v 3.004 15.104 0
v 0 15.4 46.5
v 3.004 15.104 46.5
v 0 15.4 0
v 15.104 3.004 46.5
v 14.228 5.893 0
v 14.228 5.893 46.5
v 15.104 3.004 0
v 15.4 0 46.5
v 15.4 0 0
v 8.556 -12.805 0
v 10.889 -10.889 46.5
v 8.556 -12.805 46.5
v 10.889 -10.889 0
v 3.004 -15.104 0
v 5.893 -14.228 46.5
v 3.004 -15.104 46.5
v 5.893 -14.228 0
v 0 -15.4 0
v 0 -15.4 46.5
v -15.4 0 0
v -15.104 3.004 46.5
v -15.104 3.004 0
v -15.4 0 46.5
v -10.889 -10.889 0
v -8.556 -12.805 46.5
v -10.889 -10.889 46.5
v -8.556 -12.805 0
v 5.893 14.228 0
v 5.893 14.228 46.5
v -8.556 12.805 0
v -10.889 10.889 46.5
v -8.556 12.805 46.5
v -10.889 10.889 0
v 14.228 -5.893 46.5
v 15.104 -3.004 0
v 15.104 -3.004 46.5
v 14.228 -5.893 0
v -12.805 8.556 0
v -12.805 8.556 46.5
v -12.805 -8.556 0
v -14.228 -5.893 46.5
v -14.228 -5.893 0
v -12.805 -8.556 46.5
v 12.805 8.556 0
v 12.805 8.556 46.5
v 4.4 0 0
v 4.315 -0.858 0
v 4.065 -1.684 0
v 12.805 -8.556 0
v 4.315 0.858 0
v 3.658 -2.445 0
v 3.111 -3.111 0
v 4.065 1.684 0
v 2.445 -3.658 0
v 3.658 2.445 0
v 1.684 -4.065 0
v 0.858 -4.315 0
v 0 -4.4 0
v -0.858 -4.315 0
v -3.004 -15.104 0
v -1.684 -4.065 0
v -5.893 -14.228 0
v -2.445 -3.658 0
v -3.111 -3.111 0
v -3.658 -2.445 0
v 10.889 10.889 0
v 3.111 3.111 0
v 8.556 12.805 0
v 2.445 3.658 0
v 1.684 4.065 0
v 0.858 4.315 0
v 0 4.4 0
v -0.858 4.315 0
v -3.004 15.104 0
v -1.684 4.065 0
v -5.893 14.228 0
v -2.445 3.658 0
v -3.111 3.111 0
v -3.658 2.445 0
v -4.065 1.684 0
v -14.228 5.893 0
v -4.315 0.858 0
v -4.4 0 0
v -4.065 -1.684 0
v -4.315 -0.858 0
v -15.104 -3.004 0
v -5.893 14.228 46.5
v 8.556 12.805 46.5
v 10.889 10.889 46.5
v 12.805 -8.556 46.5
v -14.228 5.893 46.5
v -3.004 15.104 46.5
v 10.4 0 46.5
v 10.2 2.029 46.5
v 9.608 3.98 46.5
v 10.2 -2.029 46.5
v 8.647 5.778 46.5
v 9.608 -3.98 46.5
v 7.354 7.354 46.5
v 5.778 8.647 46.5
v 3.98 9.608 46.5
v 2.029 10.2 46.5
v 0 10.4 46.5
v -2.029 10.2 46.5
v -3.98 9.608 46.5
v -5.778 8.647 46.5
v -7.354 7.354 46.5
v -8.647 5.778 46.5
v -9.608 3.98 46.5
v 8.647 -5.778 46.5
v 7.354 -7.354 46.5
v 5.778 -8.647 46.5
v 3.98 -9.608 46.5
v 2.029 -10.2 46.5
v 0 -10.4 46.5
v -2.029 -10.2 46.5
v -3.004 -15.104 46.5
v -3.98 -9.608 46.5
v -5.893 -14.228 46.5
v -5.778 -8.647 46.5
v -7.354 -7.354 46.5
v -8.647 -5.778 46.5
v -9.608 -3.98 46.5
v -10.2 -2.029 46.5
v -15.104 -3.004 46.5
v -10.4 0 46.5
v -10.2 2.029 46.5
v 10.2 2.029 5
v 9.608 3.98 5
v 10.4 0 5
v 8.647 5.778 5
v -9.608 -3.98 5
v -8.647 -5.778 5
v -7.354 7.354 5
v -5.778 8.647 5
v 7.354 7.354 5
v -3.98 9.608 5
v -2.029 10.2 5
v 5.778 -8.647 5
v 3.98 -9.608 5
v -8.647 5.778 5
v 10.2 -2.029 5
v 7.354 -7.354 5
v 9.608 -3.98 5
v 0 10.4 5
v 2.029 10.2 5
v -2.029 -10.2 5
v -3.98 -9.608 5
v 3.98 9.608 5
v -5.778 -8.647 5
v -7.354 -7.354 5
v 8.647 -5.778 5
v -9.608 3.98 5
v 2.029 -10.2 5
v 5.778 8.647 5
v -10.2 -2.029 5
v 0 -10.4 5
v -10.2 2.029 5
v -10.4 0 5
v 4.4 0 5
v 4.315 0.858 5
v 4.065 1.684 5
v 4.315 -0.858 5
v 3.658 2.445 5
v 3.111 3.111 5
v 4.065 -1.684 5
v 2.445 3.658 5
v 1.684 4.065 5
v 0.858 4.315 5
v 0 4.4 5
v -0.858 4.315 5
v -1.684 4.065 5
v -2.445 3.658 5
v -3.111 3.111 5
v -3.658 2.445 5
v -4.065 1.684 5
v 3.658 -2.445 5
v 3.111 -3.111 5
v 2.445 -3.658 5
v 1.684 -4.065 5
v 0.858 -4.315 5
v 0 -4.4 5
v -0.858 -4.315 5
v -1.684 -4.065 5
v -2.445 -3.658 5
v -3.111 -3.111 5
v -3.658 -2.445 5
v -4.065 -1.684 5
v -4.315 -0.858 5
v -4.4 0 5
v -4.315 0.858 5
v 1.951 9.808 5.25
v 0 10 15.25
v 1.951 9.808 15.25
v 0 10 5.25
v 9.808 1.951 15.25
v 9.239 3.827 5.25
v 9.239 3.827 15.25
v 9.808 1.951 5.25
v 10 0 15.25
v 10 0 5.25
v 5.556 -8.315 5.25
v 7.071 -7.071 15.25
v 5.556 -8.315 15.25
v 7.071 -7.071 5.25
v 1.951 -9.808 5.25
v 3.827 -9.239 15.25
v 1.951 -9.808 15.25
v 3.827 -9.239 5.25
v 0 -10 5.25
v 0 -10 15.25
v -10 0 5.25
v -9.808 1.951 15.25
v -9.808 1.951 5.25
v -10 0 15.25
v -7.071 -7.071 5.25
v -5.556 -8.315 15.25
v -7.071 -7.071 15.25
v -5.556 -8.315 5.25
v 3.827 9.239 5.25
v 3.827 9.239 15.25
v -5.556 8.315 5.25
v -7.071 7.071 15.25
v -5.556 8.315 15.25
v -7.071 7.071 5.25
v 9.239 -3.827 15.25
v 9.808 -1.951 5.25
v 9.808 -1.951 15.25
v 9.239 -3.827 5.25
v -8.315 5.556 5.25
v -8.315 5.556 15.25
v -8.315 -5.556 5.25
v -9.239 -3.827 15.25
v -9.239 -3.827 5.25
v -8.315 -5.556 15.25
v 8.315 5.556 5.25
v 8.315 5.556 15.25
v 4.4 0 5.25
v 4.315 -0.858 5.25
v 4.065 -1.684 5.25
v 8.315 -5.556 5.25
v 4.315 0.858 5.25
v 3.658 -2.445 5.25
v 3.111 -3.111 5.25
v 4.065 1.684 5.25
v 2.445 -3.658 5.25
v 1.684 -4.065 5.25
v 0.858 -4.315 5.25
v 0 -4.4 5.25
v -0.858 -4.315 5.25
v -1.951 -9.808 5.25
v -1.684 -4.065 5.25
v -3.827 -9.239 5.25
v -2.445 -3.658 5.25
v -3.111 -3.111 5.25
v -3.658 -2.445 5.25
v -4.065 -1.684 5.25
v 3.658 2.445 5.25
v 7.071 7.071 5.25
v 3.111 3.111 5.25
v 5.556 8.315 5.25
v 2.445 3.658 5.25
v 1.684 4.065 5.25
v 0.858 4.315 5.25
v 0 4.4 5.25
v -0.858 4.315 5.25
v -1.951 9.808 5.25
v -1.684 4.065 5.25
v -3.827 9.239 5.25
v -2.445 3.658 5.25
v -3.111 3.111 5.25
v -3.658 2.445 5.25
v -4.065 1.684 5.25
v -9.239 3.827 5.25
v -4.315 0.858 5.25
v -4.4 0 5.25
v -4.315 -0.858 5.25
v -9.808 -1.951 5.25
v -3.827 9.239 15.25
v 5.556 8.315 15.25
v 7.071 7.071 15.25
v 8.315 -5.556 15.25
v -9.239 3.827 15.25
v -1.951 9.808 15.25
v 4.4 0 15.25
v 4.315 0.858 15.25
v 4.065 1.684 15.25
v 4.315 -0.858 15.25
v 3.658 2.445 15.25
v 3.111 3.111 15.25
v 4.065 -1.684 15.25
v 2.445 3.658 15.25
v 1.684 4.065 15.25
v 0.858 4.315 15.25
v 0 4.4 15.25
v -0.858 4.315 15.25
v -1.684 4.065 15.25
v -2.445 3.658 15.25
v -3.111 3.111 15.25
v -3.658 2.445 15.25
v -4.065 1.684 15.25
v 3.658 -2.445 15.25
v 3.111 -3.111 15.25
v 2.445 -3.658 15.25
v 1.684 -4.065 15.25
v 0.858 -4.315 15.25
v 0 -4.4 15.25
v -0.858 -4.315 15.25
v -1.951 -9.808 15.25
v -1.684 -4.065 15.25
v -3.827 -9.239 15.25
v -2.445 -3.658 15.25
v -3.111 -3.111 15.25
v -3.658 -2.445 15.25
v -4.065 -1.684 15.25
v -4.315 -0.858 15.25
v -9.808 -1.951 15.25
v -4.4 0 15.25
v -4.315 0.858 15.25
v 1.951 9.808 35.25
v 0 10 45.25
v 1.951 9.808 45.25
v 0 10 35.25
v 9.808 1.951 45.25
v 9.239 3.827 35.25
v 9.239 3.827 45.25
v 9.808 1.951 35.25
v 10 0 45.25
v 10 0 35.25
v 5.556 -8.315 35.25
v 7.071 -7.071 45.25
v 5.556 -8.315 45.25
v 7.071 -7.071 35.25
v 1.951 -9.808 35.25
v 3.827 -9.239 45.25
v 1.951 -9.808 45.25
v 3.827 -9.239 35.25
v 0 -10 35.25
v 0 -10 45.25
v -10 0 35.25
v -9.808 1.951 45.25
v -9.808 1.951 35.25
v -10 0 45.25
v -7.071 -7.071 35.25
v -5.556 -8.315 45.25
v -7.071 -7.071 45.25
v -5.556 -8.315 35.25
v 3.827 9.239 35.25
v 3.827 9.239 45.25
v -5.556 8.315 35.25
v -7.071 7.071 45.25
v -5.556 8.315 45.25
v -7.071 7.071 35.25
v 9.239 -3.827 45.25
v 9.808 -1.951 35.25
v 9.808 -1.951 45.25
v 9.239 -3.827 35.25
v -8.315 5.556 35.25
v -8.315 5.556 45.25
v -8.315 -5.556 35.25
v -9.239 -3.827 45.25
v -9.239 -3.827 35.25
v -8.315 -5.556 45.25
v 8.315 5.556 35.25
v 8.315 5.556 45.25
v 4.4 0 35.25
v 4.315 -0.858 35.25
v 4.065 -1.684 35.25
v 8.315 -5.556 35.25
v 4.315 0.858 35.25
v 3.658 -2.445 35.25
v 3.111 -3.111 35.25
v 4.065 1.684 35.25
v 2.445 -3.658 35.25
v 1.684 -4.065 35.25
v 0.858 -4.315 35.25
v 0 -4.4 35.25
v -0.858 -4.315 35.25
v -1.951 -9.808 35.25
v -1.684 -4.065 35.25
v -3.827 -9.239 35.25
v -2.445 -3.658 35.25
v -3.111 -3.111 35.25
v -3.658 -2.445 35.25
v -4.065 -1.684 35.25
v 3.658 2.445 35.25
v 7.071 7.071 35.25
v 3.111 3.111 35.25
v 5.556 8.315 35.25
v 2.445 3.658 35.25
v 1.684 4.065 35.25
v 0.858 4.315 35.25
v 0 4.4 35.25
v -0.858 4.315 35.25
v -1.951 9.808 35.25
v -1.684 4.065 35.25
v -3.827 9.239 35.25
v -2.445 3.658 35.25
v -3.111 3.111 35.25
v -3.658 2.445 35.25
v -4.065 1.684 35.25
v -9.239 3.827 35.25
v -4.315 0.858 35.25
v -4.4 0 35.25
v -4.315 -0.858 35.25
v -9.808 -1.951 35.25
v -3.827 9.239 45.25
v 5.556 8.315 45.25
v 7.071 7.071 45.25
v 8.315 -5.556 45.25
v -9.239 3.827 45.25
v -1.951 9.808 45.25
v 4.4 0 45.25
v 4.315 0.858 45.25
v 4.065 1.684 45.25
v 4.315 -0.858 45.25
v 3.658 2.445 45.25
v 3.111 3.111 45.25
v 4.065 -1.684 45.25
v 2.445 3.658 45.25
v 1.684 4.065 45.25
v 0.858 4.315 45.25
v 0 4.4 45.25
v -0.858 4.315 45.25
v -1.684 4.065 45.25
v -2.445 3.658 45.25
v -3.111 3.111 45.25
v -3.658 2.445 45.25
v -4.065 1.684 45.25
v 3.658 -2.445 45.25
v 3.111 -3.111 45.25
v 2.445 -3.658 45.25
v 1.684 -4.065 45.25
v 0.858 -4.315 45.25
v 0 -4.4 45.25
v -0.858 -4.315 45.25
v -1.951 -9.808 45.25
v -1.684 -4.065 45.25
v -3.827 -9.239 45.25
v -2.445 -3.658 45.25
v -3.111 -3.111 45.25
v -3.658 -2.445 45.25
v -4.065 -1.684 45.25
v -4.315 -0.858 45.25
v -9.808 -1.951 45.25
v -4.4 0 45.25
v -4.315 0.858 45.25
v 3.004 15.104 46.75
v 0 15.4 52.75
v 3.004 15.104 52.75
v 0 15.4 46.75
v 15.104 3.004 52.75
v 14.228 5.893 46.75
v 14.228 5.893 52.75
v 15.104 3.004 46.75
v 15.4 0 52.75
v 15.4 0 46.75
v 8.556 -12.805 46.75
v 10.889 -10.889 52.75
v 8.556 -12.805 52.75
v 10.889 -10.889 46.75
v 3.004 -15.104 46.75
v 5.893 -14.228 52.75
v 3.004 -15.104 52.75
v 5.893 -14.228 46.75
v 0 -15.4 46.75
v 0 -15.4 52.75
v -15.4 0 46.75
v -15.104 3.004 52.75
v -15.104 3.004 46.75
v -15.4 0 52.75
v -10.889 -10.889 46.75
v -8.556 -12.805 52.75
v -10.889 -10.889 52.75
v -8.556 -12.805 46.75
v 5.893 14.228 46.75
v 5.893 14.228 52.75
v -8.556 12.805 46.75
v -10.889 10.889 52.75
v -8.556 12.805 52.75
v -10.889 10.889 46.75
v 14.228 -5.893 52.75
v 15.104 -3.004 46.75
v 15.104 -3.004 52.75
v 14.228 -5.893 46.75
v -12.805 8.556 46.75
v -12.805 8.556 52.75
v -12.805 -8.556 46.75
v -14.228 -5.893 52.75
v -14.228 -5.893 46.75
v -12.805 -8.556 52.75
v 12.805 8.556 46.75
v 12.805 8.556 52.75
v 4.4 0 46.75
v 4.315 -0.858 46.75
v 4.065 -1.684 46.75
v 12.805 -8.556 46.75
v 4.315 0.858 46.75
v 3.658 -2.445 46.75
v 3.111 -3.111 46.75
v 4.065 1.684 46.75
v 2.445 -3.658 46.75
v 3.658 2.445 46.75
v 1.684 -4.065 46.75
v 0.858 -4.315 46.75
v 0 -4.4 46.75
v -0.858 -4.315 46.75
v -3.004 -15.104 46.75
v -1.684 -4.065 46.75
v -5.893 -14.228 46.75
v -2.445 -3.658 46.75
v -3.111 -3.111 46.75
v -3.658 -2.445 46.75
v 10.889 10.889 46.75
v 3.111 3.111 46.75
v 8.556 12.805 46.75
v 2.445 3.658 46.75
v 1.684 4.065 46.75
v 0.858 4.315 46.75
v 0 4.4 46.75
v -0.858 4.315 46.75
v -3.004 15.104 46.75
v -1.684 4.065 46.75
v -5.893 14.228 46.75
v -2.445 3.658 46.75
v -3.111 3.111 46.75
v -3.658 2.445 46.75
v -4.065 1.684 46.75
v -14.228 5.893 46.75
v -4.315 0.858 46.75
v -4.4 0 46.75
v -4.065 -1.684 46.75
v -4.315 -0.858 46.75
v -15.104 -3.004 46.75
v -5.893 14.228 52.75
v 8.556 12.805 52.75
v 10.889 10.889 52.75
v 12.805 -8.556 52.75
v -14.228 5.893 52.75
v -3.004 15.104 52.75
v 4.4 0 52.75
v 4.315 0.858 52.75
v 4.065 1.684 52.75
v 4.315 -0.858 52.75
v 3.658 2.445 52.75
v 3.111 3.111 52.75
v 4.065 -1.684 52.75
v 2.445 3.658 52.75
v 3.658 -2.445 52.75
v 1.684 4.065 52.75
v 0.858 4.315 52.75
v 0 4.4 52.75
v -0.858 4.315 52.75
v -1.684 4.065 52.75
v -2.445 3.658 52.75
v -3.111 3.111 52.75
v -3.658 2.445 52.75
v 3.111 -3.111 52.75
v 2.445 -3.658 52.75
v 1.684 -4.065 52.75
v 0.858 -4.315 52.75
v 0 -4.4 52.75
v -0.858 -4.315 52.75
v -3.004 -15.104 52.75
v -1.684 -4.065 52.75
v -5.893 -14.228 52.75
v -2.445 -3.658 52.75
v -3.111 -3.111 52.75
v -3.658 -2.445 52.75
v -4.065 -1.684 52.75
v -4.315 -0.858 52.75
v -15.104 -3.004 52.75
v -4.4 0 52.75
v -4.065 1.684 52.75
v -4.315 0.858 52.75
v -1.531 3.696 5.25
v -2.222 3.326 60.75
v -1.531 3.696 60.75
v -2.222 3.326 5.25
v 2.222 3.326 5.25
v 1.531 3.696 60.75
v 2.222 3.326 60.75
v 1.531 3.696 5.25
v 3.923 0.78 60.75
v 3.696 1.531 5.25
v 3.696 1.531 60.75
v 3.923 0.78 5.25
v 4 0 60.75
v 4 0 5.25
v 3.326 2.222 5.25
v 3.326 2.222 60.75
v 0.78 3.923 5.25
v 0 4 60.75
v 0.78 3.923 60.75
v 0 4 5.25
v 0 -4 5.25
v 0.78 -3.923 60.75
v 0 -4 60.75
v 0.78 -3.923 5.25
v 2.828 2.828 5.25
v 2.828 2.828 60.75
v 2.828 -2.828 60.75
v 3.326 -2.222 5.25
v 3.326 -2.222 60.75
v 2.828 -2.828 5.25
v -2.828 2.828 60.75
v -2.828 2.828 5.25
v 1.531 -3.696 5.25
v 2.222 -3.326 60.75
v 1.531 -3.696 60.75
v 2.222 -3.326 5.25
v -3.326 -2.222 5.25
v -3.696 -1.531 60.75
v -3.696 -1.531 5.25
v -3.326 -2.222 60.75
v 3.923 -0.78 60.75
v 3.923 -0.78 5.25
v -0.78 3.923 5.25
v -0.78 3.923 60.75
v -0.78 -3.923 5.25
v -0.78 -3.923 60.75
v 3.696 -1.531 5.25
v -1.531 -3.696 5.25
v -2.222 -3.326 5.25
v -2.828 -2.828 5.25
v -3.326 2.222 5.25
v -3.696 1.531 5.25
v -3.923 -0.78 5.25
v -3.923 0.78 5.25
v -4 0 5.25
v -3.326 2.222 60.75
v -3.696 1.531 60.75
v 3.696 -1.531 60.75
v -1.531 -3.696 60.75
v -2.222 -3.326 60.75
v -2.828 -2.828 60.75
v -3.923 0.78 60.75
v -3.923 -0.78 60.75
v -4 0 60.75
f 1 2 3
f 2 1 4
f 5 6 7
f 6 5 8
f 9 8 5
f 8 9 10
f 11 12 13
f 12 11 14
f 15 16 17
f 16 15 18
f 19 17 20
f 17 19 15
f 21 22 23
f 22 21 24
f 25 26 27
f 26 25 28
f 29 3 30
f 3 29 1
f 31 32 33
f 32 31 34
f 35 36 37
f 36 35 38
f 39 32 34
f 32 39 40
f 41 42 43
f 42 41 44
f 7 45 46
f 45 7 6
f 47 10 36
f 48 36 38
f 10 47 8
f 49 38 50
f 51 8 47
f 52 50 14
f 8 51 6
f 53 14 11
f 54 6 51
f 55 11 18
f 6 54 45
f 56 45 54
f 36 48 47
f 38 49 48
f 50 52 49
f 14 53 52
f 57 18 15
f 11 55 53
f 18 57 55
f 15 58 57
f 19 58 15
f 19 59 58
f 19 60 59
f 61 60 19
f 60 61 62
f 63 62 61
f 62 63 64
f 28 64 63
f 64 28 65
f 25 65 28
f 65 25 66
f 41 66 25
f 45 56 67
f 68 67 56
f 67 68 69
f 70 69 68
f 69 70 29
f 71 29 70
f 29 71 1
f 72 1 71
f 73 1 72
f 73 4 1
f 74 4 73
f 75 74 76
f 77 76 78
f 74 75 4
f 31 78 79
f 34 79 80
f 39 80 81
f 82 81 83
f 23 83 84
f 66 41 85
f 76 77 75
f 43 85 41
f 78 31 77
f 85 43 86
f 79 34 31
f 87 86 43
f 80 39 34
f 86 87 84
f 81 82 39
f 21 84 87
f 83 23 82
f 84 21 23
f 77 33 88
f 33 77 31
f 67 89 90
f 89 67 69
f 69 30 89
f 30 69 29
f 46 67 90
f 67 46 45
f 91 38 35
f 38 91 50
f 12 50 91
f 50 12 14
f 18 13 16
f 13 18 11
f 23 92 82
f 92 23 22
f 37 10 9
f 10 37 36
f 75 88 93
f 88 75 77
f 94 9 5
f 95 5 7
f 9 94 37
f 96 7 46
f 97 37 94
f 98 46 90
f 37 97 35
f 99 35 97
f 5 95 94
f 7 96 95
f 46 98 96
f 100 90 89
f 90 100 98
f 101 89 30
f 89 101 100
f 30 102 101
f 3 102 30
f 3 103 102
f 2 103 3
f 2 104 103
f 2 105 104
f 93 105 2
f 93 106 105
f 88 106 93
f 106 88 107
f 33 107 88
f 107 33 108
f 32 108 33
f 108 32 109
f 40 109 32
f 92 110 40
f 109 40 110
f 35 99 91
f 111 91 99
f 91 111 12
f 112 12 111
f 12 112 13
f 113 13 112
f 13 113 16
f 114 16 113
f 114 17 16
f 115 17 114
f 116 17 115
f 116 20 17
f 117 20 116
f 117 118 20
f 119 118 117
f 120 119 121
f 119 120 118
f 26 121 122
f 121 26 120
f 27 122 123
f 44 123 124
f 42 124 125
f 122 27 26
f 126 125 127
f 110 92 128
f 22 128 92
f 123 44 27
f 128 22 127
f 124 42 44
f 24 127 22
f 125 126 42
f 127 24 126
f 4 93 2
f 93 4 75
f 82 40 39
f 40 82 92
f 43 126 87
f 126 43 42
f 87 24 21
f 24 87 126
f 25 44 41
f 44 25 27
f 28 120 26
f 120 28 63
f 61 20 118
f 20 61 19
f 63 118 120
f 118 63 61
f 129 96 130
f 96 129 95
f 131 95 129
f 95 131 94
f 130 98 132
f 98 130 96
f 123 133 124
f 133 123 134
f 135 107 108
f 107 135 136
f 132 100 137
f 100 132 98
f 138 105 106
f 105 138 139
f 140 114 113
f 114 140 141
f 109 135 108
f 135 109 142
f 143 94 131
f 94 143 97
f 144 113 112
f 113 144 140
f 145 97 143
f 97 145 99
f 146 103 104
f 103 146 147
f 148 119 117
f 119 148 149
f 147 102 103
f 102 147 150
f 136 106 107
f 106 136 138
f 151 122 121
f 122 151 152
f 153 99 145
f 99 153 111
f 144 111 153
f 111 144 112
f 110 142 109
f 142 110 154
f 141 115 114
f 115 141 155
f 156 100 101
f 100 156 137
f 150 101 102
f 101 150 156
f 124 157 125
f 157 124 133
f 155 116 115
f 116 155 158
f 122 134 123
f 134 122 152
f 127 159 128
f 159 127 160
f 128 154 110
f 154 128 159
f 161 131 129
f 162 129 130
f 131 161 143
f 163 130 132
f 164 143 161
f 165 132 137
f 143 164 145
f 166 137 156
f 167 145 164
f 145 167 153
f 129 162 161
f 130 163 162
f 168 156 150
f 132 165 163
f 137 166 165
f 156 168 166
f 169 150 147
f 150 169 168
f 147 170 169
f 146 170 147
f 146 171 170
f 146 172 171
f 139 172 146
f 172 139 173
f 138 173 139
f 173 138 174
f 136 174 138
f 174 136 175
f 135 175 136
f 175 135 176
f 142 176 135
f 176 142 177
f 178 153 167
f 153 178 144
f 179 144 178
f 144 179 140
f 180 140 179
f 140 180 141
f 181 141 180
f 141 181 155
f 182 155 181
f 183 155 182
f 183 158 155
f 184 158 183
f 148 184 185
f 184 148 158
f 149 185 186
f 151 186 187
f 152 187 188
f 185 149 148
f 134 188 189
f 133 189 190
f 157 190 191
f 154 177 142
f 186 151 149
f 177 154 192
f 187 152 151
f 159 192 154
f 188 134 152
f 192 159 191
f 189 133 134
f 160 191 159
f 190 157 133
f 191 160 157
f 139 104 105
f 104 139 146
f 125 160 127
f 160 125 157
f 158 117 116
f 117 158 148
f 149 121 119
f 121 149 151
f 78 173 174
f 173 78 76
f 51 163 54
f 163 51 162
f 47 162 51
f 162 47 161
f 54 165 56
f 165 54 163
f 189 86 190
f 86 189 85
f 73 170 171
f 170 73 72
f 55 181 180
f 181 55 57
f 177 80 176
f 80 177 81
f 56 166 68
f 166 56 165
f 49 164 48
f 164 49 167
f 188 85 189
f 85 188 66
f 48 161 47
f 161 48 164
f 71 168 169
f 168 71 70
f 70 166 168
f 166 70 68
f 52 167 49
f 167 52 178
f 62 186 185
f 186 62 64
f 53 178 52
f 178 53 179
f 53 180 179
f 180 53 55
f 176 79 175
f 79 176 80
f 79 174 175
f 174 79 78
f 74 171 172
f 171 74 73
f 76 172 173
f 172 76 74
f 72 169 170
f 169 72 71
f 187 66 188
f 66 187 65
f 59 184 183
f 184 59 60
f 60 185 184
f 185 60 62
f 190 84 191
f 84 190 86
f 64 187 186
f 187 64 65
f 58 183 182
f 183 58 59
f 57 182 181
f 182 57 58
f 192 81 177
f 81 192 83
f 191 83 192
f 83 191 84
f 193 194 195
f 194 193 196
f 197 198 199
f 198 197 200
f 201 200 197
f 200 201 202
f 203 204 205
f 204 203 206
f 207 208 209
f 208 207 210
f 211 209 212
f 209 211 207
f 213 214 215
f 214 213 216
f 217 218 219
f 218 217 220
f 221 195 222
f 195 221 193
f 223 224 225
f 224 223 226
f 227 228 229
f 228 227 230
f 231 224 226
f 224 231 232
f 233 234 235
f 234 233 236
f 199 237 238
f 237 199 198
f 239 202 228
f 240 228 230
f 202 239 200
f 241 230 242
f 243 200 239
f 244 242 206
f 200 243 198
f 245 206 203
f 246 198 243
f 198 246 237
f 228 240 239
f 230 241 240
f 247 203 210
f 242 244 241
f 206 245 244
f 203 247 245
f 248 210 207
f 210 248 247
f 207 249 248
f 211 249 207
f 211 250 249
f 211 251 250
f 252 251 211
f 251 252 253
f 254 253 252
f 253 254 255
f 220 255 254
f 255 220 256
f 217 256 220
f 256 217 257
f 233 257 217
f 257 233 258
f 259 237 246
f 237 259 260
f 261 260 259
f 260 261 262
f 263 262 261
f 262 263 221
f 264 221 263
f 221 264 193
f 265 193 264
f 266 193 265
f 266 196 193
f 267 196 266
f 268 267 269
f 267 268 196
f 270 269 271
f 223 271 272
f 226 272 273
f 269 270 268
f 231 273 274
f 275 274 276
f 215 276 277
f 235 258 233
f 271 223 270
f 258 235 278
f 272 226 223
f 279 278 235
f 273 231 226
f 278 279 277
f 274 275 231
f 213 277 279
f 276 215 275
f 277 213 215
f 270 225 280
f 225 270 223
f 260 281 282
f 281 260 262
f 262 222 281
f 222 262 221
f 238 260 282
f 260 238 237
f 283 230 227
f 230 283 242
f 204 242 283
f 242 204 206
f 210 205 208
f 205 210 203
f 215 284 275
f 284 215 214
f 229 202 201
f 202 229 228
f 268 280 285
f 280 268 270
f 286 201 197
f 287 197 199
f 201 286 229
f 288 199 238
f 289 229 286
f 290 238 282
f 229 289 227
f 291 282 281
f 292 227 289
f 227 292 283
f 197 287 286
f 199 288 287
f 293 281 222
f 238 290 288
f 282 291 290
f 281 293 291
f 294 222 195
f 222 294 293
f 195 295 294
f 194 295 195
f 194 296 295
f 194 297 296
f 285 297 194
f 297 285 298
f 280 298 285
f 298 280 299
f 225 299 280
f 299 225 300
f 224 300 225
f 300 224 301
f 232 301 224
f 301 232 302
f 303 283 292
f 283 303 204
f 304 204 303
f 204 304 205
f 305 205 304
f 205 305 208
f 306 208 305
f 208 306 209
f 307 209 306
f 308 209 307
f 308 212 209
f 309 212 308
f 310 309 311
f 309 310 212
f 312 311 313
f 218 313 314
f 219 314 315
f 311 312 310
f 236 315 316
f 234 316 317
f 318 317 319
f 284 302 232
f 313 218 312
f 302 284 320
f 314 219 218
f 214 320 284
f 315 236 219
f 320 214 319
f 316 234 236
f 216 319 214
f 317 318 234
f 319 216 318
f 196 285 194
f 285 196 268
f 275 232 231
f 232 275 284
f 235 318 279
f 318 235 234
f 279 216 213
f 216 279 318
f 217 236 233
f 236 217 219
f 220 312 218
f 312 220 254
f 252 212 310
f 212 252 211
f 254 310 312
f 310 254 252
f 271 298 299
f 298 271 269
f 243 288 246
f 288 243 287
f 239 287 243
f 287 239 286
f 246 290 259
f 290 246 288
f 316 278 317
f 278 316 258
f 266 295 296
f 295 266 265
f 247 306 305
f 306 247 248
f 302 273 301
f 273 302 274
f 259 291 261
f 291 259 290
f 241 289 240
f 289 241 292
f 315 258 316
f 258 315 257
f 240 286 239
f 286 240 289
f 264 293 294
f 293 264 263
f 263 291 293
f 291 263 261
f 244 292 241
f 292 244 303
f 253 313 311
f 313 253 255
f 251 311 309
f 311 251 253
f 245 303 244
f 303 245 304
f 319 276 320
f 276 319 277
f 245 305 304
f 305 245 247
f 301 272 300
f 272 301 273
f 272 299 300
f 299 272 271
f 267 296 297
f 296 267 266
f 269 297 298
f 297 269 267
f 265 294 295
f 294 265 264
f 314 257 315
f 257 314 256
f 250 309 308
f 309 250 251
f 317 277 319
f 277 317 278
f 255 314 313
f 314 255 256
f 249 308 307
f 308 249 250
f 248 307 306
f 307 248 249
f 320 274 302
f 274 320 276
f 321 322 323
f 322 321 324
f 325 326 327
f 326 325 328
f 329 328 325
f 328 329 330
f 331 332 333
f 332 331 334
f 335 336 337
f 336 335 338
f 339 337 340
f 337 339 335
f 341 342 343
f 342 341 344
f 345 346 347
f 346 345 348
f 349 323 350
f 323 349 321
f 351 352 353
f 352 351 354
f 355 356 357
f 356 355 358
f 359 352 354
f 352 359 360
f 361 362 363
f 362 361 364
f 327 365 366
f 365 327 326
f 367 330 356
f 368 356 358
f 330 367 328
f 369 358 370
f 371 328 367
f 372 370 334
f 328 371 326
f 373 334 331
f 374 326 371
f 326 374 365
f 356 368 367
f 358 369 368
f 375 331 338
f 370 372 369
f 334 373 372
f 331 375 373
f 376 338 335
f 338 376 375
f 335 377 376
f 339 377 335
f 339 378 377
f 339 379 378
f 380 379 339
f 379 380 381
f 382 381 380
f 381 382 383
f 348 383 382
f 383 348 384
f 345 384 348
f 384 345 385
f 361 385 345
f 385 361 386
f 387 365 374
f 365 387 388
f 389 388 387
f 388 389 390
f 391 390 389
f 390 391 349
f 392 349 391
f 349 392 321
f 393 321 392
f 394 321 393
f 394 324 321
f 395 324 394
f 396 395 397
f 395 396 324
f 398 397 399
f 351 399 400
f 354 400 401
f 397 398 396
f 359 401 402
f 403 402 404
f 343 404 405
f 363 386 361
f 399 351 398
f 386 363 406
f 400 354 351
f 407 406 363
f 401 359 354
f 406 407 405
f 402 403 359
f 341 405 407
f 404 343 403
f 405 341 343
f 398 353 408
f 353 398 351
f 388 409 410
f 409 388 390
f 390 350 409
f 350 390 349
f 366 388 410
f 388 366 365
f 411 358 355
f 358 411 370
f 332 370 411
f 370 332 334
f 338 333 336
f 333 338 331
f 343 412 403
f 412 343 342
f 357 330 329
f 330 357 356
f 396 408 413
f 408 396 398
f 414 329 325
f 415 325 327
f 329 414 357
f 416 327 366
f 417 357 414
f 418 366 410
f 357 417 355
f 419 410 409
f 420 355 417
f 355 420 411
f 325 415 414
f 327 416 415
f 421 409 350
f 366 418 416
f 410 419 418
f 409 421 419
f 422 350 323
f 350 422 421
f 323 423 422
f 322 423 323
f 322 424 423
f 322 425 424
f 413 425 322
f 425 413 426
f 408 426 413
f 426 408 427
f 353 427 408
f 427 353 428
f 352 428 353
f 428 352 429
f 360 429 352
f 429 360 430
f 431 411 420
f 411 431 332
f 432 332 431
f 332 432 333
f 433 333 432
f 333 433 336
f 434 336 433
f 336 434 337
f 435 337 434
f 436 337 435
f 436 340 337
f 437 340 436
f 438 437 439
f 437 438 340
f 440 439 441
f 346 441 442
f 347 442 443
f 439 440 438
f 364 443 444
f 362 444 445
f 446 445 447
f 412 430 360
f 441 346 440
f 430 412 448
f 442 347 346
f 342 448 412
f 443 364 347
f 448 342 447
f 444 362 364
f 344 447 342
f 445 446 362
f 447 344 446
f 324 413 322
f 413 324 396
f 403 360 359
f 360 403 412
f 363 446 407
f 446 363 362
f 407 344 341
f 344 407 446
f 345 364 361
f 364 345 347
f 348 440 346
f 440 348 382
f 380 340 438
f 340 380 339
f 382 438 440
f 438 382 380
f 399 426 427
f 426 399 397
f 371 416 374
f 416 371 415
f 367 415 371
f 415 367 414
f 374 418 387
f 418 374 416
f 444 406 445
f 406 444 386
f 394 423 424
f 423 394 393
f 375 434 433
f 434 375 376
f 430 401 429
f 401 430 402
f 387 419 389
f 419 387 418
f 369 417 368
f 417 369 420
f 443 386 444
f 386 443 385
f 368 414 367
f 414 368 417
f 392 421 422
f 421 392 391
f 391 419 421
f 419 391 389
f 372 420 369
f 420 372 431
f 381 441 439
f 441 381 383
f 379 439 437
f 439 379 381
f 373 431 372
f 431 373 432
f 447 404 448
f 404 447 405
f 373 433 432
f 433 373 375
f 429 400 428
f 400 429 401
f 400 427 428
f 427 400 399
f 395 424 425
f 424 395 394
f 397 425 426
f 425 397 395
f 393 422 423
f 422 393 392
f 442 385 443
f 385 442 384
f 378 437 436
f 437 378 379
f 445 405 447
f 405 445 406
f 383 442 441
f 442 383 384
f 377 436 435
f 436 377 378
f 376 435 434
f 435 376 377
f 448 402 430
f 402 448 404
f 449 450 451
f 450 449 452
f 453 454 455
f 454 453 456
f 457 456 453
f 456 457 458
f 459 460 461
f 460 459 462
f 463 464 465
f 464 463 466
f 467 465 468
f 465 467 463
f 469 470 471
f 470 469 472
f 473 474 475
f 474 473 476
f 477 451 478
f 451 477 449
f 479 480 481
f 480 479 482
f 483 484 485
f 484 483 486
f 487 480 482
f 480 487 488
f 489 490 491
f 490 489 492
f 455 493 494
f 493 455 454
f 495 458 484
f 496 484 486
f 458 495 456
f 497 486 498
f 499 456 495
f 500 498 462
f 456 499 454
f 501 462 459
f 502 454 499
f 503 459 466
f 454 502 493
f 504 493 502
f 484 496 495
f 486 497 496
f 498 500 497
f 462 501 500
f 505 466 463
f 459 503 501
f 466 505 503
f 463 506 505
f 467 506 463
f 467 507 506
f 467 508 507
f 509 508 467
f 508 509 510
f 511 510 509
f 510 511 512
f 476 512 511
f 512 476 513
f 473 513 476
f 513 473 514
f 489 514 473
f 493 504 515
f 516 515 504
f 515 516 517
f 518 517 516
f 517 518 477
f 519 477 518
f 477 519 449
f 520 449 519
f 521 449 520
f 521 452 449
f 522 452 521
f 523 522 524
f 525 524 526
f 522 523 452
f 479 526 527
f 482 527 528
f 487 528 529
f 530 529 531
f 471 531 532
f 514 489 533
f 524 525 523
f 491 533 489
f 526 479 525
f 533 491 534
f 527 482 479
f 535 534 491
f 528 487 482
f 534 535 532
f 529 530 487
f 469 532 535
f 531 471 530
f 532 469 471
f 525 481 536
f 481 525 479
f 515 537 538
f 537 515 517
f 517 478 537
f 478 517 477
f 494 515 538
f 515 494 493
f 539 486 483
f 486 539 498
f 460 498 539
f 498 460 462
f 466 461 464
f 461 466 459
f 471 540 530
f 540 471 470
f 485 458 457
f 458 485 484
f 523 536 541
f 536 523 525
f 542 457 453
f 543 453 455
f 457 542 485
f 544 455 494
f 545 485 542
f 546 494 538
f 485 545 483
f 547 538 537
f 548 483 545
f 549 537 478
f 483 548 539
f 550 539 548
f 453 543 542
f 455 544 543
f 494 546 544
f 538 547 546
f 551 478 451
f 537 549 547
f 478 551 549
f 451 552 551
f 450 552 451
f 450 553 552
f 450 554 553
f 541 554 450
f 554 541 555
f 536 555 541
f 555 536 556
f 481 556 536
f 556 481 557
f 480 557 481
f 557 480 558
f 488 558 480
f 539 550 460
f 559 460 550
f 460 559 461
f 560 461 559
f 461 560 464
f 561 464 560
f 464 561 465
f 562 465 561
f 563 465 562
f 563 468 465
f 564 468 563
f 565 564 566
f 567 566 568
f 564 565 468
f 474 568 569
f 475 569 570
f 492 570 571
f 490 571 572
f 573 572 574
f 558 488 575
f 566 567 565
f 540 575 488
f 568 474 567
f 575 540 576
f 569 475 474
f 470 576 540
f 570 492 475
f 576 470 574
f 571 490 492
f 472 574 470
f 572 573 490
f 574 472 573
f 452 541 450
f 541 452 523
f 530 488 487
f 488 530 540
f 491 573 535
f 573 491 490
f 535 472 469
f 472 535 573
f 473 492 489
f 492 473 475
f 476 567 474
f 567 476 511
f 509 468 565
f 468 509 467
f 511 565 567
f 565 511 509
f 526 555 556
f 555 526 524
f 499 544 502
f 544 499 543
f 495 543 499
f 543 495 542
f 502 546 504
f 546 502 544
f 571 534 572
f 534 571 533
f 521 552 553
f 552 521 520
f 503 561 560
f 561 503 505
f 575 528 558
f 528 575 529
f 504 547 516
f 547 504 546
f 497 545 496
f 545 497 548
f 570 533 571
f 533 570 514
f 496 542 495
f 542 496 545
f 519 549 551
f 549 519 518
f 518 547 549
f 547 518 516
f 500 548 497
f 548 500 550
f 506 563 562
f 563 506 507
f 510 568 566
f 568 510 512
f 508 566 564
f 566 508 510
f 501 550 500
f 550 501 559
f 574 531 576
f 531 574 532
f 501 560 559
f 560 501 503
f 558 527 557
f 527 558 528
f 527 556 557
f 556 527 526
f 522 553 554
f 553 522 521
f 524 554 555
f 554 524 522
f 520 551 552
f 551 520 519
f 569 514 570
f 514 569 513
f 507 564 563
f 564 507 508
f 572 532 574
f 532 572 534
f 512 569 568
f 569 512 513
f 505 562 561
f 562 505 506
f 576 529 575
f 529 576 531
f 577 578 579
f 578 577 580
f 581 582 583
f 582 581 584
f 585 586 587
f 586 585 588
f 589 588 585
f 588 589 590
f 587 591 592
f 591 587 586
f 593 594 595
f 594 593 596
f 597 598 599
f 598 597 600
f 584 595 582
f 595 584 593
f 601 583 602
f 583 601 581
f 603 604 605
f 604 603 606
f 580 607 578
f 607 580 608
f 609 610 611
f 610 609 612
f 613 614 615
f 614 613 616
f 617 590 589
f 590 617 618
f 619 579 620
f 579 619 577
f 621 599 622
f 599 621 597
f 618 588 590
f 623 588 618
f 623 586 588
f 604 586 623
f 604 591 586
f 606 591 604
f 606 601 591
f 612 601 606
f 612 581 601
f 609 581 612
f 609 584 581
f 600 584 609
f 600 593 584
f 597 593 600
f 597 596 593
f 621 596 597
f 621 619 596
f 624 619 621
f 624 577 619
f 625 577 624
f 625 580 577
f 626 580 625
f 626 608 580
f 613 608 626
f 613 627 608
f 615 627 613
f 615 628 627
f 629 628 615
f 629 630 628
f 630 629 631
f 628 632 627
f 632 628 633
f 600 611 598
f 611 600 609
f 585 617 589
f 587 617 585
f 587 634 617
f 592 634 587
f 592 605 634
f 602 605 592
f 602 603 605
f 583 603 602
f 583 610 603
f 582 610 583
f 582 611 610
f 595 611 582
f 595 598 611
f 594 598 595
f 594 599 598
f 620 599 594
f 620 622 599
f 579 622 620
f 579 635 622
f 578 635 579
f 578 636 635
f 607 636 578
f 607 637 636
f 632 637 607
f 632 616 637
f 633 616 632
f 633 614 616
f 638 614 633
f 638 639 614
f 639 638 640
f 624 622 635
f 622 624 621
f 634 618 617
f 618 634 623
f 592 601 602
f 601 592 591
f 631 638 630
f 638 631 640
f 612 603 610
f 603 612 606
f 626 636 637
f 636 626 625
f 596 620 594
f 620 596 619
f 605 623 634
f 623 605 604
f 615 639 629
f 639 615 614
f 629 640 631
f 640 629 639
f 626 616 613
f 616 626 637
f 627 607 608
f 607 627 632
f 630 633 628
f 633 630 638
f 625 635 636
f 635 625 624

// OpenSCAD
$fn = 32;

// ------------------------------------------------------------------------
// Shaft station: cup d30.8 x 46.5 mm, shaft d8
// Every part is its own module, assembly() places every instance.
// ------------------------------------------------------------------------

// --- part 1 ---
module housing_cup() {
  difference() {
    cylinder(h = 46.5, d = 30.8);
    translate([0, 0, 5]) cylinder(h = 42.5, d = 20.8);
    translate([0, 0, -1]) cylinder(h = 7, d = 8.8);
  }
}

// --- part 2 ---
module bearing_lower() {
  difference() {
      translate([0, 0, 0]) cylinder(h = 10, d = 20);
      translate([0, 0, -1]) cylinder(h = 12, d = 8.8);
    }
}

// --- part 3 ---
module bearing_upper() {
  difference() {
      translate([0, 0, 0]) cylinder(h = 10, d = 20);
      translate([0, 0, -1]) cylinder(h = 12, d = 8.8);
    }
}

// --- part 4 ---
module station_shaft() {
  translate([0, 0, -27.75]) cylinder(h = 55.5, d = 8);
}

// --- part 5 ---
module station_cover() {
  difference() {
    cylinder(h = 6, d = 30.8);
    translate([0, 0, -1]) cylinder(h = 8, d = 8.8);
  }
}

// --- assembly ---
module assembly() {
  color([0.80, 0.24, 0.20]) translate([0, 0, 0]) rotate([0, 0, 0]) housing_cup();
  color([0.20, 0.45, 0.75]) translate([0, 0, 5.25]) rotate([0, 0, 0]) bearing_lower();
  color([0.25, 0.62, 0.32]) translate([0, 0, 35.25]) rotate([0, 0, 0]) bearing_upper();
  color([0.92, 0.70, 0.18]) translate([0, 0, 33]) rotate([0, 0, 0]) station_shaft();
  color([0.58, 0.35, 0.70]) translate([0, 0, 46.75]) rotate([0, 0, 0]) station_cover();
}

assembly();
